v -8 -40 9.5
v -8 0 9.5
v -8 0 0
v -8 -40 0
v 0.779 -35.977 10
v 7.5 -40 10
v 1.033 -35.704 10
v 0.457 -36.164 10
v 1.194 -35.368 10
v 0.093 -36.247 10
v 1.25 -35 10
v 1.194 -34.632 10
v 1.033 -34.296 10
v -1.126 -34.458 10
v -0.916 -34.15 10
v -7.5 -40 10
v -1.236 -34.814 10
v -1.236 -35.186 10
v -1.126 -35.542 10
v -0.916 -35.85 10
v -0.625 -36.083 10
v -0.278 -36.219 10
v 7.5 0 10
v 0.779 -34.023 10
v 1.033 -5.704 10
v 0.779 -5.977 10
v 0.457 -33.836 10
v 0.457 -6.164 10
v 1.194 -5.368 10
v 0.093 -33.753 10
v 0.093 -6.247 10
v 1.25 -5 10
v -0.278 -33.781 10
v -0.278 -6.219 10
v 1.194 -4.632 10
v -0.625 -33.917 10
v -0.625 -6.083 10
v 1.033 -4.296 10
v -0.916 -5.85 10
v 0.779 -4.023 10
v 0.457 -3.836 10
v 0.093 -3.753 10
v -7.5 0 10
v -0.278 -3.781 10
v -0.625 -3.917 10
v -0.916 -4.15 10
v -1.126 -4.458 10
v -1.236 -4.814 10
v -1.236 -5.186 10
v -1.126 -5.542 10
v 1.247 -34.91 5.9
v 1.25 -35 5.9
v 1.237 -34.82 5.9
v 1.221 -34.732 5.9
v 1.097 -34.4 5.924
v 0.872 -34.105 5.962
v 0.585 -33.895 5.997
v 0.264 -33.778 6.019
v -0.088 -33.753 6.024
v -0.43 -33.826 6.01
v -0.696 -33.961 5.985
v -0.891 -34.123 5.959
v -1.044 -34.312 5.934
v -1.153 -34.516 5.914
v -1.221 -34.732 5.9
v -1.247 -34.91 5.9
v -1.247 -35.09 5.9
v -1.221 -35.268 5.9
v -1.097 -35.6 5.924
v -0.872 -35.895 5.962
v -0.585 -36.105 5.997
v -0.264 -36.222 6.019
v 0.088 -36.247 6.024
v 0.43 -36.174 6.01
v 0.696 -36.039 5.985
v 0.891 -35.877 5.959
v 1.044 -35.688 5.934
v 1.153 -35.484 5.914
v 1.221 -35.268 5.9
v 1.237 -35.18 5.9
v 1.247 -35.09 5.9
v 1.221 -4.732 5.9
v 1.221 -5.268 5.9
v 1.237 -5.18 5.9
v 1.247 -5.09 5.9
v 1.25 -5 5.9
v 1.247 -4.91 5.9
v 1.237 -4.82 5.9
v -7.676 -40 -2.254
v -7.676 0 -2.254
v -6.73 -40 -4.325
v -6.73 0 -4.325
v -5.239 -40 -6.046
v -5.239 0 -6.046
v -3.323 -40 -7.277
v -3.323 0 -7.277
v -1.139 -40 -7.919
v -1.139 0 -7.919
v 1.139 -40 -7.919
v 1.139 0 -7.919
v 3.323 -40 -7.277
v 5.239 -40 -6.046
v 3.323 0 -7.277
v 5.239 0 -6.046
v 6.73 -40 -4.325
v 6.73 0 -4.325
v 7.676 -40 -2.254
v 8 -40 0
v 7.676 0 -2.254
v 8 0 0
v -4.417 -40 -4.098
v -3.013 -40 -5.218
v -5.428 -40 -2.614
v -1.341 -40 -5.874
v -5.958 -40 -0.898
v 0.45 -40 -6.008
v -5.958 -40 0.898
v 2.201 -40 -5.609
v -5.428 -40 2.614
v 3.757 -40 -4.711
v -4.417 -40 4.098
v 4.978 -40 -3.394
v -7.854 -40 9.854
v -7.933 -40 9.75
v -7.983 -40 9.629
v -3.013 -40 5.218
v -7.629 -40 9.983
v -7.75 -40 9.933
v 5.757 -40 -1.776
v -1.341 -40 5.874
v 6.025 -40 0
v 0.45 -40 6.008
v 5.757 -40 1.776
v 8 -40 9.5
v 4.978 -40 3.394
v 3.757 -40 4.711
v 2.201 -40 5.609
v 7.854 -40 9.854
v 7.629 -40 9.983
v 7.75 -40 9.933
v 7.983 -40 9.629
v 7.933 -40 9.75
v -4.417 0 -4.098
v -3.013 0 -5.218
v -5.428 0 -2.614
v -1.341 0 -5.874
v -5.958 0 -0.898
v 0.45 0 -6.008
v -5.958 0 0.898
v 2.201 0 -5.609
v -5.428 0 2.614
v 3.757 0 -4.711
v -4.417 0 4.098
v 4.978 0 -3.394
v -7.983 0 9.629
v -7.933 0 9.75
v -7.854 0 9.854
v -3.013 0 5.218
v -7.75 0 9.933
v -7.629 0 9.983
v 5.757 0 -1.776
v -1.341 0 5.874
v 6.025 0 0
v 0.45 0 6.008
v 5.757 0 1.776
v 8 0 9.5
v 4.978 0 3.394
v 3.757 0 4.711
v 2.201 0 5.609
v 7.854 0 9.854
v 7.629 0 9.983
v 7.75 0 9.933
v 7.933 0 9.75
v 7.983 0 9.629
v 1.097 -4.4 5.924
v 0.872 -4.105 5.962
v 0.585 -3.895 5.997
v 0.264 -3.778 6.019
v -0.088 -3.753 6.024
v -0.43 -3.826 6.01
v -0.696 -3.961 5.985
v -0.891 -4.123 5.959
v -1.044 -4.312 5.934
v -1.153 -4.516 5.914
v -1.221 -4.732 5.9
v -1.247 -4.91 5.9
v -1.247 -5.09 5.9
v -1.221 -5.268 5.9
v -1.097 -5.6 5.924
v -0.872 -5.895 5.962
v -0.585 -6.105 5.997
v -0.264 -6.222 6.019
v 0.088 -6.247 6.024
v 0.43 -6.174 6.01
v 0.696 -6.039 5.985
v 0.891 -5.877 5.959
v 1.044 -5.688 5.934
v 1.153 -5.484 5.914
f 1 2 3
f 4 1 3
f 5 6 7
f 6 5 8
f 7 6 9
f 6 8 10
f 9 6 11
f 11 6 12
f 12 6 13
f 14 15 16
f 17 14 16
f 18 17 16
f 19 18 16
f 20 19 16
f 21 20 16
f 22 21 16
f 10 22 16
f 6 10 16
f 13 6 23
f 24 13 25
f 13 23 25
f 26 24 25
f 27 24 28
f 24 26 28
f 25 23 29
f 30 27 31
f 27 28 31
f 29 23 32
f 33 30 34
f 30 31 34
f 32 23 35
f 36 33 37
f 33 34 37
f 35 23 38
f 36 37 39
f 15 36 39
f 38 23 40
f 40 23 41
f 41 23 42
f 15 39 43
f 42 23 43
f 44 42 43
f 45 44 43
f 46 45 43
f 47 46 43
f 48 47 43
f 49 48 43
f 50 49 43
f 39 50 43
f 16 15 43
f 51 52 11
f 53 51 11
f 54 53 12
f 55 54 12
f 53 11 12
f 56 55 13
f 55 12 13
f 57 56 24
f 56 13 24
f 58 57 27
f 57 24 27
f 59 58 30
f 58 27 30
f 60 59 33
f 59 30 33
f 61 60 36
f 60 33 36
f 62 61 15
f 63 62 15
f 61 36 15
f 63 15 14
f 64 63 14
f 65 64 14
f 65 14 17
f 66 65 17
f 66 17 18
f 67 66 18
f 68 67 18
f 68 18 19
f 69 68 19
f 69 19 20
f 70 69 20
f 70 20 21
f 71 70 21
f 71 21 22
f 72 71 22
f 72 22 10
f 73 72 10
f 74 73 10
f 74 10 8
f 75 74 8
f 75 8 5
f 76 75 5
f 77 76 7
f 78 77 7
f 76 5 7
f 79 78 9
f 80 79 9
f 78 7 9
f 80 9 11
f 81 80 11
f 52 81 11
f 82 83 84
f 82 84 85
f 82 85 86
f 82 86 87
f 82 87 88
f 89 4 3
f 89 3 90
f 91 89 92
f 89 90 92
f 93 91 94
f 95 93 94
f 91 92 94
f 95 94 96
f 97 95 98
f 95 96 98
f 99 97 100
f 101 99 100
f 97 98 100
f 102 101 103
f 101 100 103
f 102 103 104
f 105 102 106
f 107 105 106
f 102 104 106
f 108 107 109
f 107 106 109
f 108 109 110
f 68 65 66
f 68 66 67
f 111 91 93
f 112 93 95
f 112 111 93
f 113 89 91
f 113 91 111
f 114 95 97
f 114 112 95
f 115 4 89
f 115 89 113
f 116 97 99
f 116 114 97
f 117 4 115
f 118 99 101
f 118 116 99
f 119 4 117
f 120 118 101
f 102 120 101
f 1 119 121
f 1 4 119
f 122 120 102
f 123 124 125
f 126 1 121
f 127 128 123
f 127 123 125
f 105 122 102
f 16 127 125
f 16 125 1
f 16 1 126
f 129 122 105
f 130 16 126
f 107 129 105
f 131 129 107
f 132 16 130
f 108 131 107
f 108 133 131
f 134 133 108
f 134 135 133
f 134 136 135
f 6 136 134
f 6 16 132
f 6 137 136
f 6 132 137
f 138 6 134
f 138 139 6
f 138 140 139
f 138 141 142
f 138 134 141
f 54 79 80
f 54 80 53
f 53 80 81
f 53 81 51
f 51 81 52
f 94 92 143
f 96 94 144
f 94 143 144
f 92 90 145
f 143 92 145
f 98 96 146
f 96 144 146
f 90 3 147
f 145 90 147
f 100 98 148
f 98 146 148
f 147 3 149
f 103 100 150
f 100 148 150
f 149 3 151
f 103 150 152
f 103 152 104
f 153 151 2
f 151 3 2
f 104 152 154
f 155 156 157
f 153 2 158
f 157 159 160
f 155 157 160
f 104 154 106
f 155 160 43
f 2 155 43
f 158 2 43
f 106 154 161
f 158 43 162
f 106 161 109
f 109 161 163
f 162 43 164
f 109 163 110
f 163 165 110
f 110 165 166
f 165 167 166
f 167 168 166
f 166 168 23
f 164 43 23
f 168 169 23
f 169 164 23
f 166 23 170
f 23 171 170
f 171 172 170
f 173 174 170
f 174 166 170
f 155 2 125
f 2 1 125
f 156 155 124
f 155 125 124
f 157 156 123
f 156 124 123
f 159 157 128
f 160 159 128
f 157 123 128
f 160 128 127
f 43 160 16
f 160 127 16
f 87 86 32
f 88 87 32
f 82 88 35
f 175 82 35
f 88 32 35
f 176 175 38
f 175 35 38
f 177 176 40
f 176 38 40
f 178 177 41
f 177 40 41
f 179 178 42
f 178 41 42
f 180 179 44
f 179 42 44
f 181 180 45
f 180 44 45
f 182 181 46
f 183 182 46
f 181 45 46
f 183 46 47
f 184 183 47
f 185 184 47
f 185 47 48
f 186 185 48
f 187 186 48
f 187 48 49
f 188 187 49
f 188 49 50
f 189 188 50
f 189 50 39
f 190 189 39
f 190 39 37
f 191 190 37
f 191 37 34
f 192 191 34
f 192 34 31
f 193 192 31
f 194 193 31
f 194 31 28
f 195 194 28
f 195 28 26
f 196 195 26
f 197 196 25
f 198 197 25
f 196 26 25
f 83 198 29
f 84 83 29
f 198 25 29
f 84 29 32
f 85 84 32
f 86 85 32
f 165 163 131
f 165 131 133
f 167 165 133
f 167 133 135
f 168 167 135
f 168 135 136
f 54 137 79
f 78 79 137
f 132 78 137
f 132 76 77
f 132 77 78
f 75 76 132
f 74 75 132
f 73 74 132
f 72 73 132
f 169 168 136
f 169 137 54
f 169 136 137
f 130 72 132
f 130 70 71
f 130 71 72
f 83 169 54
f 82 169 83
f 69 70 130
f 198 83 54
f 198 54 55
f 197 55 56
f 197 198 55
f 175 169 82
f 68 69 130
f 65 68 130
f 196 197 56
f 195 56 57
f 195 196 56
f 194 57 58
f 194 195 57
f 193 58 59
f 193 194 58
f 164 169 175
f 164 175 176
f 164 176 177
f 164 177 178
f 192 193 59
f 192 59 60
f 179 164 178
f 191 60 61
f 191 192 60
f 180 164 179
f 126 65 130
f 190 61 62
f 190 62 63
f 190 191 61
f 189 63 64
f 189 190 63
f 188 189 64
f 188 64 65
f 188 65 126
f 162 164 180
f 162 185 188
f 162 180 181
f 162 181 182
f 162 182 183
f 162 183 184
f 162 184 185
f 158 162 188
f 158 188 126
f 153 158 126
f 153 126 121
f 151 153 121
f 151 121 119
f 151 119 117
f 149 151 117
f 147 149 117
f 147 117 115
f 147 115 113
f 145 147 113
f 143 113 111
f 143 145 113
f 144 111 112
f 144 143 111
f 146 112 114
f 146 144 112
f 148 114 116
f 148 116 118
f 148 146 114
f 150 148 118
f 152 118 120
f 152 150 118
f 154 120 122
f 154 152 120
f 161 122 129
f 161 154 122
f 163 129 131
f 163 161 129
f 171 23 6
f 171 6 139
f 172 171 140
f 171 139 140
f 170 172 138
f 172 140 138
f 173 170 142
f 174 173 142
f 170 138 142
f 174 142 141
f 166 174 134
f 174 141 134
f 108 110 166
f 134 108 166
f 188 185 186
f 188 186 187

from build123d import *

# Parameters (mm, degrees)
F0_R     = 6.025
F1_DEPTH = 40
F2_R     = 1.25
F3_DEPTH = 4.1
F4_R     = 0.5


with BuildPart() as f1:
    # F0 (on Front) → F1 (new body)
    with BuildSketch(Plane.XZ):
        with BuildLine():
            Line((-8, 10), (-8, 0))
            ThreePointArc((-8, 0), (0, -8), (8, 0))
            Line((8, 0), (8, 10))
            Line((8, 10), (-8, 10))
        make_face()
        Circle(F0_R, mode=Mode.SUBTRACT)
    extrude(amount=F1_DEPTH)

    # F2 (on face) → F3 (cut)
    with BuildSketch(Plane.XY.offset(10)):
        with Locations((0, -5)):
            Circle(F2_R)
        with Locations((0, -35)):
            Circle(F2_R)
    extrude(amount=-F3_DEPTH, mode=Mode.SUBTRACT)

    # F4
    f4_edges = [f1.edges().sort_by_distance(p)[0] for p in [
        (-8, -20, 10),
        (8, -20, 10),
    ]]
    fillet(f4_edges, radius=F4_R)


solid = f1.part
